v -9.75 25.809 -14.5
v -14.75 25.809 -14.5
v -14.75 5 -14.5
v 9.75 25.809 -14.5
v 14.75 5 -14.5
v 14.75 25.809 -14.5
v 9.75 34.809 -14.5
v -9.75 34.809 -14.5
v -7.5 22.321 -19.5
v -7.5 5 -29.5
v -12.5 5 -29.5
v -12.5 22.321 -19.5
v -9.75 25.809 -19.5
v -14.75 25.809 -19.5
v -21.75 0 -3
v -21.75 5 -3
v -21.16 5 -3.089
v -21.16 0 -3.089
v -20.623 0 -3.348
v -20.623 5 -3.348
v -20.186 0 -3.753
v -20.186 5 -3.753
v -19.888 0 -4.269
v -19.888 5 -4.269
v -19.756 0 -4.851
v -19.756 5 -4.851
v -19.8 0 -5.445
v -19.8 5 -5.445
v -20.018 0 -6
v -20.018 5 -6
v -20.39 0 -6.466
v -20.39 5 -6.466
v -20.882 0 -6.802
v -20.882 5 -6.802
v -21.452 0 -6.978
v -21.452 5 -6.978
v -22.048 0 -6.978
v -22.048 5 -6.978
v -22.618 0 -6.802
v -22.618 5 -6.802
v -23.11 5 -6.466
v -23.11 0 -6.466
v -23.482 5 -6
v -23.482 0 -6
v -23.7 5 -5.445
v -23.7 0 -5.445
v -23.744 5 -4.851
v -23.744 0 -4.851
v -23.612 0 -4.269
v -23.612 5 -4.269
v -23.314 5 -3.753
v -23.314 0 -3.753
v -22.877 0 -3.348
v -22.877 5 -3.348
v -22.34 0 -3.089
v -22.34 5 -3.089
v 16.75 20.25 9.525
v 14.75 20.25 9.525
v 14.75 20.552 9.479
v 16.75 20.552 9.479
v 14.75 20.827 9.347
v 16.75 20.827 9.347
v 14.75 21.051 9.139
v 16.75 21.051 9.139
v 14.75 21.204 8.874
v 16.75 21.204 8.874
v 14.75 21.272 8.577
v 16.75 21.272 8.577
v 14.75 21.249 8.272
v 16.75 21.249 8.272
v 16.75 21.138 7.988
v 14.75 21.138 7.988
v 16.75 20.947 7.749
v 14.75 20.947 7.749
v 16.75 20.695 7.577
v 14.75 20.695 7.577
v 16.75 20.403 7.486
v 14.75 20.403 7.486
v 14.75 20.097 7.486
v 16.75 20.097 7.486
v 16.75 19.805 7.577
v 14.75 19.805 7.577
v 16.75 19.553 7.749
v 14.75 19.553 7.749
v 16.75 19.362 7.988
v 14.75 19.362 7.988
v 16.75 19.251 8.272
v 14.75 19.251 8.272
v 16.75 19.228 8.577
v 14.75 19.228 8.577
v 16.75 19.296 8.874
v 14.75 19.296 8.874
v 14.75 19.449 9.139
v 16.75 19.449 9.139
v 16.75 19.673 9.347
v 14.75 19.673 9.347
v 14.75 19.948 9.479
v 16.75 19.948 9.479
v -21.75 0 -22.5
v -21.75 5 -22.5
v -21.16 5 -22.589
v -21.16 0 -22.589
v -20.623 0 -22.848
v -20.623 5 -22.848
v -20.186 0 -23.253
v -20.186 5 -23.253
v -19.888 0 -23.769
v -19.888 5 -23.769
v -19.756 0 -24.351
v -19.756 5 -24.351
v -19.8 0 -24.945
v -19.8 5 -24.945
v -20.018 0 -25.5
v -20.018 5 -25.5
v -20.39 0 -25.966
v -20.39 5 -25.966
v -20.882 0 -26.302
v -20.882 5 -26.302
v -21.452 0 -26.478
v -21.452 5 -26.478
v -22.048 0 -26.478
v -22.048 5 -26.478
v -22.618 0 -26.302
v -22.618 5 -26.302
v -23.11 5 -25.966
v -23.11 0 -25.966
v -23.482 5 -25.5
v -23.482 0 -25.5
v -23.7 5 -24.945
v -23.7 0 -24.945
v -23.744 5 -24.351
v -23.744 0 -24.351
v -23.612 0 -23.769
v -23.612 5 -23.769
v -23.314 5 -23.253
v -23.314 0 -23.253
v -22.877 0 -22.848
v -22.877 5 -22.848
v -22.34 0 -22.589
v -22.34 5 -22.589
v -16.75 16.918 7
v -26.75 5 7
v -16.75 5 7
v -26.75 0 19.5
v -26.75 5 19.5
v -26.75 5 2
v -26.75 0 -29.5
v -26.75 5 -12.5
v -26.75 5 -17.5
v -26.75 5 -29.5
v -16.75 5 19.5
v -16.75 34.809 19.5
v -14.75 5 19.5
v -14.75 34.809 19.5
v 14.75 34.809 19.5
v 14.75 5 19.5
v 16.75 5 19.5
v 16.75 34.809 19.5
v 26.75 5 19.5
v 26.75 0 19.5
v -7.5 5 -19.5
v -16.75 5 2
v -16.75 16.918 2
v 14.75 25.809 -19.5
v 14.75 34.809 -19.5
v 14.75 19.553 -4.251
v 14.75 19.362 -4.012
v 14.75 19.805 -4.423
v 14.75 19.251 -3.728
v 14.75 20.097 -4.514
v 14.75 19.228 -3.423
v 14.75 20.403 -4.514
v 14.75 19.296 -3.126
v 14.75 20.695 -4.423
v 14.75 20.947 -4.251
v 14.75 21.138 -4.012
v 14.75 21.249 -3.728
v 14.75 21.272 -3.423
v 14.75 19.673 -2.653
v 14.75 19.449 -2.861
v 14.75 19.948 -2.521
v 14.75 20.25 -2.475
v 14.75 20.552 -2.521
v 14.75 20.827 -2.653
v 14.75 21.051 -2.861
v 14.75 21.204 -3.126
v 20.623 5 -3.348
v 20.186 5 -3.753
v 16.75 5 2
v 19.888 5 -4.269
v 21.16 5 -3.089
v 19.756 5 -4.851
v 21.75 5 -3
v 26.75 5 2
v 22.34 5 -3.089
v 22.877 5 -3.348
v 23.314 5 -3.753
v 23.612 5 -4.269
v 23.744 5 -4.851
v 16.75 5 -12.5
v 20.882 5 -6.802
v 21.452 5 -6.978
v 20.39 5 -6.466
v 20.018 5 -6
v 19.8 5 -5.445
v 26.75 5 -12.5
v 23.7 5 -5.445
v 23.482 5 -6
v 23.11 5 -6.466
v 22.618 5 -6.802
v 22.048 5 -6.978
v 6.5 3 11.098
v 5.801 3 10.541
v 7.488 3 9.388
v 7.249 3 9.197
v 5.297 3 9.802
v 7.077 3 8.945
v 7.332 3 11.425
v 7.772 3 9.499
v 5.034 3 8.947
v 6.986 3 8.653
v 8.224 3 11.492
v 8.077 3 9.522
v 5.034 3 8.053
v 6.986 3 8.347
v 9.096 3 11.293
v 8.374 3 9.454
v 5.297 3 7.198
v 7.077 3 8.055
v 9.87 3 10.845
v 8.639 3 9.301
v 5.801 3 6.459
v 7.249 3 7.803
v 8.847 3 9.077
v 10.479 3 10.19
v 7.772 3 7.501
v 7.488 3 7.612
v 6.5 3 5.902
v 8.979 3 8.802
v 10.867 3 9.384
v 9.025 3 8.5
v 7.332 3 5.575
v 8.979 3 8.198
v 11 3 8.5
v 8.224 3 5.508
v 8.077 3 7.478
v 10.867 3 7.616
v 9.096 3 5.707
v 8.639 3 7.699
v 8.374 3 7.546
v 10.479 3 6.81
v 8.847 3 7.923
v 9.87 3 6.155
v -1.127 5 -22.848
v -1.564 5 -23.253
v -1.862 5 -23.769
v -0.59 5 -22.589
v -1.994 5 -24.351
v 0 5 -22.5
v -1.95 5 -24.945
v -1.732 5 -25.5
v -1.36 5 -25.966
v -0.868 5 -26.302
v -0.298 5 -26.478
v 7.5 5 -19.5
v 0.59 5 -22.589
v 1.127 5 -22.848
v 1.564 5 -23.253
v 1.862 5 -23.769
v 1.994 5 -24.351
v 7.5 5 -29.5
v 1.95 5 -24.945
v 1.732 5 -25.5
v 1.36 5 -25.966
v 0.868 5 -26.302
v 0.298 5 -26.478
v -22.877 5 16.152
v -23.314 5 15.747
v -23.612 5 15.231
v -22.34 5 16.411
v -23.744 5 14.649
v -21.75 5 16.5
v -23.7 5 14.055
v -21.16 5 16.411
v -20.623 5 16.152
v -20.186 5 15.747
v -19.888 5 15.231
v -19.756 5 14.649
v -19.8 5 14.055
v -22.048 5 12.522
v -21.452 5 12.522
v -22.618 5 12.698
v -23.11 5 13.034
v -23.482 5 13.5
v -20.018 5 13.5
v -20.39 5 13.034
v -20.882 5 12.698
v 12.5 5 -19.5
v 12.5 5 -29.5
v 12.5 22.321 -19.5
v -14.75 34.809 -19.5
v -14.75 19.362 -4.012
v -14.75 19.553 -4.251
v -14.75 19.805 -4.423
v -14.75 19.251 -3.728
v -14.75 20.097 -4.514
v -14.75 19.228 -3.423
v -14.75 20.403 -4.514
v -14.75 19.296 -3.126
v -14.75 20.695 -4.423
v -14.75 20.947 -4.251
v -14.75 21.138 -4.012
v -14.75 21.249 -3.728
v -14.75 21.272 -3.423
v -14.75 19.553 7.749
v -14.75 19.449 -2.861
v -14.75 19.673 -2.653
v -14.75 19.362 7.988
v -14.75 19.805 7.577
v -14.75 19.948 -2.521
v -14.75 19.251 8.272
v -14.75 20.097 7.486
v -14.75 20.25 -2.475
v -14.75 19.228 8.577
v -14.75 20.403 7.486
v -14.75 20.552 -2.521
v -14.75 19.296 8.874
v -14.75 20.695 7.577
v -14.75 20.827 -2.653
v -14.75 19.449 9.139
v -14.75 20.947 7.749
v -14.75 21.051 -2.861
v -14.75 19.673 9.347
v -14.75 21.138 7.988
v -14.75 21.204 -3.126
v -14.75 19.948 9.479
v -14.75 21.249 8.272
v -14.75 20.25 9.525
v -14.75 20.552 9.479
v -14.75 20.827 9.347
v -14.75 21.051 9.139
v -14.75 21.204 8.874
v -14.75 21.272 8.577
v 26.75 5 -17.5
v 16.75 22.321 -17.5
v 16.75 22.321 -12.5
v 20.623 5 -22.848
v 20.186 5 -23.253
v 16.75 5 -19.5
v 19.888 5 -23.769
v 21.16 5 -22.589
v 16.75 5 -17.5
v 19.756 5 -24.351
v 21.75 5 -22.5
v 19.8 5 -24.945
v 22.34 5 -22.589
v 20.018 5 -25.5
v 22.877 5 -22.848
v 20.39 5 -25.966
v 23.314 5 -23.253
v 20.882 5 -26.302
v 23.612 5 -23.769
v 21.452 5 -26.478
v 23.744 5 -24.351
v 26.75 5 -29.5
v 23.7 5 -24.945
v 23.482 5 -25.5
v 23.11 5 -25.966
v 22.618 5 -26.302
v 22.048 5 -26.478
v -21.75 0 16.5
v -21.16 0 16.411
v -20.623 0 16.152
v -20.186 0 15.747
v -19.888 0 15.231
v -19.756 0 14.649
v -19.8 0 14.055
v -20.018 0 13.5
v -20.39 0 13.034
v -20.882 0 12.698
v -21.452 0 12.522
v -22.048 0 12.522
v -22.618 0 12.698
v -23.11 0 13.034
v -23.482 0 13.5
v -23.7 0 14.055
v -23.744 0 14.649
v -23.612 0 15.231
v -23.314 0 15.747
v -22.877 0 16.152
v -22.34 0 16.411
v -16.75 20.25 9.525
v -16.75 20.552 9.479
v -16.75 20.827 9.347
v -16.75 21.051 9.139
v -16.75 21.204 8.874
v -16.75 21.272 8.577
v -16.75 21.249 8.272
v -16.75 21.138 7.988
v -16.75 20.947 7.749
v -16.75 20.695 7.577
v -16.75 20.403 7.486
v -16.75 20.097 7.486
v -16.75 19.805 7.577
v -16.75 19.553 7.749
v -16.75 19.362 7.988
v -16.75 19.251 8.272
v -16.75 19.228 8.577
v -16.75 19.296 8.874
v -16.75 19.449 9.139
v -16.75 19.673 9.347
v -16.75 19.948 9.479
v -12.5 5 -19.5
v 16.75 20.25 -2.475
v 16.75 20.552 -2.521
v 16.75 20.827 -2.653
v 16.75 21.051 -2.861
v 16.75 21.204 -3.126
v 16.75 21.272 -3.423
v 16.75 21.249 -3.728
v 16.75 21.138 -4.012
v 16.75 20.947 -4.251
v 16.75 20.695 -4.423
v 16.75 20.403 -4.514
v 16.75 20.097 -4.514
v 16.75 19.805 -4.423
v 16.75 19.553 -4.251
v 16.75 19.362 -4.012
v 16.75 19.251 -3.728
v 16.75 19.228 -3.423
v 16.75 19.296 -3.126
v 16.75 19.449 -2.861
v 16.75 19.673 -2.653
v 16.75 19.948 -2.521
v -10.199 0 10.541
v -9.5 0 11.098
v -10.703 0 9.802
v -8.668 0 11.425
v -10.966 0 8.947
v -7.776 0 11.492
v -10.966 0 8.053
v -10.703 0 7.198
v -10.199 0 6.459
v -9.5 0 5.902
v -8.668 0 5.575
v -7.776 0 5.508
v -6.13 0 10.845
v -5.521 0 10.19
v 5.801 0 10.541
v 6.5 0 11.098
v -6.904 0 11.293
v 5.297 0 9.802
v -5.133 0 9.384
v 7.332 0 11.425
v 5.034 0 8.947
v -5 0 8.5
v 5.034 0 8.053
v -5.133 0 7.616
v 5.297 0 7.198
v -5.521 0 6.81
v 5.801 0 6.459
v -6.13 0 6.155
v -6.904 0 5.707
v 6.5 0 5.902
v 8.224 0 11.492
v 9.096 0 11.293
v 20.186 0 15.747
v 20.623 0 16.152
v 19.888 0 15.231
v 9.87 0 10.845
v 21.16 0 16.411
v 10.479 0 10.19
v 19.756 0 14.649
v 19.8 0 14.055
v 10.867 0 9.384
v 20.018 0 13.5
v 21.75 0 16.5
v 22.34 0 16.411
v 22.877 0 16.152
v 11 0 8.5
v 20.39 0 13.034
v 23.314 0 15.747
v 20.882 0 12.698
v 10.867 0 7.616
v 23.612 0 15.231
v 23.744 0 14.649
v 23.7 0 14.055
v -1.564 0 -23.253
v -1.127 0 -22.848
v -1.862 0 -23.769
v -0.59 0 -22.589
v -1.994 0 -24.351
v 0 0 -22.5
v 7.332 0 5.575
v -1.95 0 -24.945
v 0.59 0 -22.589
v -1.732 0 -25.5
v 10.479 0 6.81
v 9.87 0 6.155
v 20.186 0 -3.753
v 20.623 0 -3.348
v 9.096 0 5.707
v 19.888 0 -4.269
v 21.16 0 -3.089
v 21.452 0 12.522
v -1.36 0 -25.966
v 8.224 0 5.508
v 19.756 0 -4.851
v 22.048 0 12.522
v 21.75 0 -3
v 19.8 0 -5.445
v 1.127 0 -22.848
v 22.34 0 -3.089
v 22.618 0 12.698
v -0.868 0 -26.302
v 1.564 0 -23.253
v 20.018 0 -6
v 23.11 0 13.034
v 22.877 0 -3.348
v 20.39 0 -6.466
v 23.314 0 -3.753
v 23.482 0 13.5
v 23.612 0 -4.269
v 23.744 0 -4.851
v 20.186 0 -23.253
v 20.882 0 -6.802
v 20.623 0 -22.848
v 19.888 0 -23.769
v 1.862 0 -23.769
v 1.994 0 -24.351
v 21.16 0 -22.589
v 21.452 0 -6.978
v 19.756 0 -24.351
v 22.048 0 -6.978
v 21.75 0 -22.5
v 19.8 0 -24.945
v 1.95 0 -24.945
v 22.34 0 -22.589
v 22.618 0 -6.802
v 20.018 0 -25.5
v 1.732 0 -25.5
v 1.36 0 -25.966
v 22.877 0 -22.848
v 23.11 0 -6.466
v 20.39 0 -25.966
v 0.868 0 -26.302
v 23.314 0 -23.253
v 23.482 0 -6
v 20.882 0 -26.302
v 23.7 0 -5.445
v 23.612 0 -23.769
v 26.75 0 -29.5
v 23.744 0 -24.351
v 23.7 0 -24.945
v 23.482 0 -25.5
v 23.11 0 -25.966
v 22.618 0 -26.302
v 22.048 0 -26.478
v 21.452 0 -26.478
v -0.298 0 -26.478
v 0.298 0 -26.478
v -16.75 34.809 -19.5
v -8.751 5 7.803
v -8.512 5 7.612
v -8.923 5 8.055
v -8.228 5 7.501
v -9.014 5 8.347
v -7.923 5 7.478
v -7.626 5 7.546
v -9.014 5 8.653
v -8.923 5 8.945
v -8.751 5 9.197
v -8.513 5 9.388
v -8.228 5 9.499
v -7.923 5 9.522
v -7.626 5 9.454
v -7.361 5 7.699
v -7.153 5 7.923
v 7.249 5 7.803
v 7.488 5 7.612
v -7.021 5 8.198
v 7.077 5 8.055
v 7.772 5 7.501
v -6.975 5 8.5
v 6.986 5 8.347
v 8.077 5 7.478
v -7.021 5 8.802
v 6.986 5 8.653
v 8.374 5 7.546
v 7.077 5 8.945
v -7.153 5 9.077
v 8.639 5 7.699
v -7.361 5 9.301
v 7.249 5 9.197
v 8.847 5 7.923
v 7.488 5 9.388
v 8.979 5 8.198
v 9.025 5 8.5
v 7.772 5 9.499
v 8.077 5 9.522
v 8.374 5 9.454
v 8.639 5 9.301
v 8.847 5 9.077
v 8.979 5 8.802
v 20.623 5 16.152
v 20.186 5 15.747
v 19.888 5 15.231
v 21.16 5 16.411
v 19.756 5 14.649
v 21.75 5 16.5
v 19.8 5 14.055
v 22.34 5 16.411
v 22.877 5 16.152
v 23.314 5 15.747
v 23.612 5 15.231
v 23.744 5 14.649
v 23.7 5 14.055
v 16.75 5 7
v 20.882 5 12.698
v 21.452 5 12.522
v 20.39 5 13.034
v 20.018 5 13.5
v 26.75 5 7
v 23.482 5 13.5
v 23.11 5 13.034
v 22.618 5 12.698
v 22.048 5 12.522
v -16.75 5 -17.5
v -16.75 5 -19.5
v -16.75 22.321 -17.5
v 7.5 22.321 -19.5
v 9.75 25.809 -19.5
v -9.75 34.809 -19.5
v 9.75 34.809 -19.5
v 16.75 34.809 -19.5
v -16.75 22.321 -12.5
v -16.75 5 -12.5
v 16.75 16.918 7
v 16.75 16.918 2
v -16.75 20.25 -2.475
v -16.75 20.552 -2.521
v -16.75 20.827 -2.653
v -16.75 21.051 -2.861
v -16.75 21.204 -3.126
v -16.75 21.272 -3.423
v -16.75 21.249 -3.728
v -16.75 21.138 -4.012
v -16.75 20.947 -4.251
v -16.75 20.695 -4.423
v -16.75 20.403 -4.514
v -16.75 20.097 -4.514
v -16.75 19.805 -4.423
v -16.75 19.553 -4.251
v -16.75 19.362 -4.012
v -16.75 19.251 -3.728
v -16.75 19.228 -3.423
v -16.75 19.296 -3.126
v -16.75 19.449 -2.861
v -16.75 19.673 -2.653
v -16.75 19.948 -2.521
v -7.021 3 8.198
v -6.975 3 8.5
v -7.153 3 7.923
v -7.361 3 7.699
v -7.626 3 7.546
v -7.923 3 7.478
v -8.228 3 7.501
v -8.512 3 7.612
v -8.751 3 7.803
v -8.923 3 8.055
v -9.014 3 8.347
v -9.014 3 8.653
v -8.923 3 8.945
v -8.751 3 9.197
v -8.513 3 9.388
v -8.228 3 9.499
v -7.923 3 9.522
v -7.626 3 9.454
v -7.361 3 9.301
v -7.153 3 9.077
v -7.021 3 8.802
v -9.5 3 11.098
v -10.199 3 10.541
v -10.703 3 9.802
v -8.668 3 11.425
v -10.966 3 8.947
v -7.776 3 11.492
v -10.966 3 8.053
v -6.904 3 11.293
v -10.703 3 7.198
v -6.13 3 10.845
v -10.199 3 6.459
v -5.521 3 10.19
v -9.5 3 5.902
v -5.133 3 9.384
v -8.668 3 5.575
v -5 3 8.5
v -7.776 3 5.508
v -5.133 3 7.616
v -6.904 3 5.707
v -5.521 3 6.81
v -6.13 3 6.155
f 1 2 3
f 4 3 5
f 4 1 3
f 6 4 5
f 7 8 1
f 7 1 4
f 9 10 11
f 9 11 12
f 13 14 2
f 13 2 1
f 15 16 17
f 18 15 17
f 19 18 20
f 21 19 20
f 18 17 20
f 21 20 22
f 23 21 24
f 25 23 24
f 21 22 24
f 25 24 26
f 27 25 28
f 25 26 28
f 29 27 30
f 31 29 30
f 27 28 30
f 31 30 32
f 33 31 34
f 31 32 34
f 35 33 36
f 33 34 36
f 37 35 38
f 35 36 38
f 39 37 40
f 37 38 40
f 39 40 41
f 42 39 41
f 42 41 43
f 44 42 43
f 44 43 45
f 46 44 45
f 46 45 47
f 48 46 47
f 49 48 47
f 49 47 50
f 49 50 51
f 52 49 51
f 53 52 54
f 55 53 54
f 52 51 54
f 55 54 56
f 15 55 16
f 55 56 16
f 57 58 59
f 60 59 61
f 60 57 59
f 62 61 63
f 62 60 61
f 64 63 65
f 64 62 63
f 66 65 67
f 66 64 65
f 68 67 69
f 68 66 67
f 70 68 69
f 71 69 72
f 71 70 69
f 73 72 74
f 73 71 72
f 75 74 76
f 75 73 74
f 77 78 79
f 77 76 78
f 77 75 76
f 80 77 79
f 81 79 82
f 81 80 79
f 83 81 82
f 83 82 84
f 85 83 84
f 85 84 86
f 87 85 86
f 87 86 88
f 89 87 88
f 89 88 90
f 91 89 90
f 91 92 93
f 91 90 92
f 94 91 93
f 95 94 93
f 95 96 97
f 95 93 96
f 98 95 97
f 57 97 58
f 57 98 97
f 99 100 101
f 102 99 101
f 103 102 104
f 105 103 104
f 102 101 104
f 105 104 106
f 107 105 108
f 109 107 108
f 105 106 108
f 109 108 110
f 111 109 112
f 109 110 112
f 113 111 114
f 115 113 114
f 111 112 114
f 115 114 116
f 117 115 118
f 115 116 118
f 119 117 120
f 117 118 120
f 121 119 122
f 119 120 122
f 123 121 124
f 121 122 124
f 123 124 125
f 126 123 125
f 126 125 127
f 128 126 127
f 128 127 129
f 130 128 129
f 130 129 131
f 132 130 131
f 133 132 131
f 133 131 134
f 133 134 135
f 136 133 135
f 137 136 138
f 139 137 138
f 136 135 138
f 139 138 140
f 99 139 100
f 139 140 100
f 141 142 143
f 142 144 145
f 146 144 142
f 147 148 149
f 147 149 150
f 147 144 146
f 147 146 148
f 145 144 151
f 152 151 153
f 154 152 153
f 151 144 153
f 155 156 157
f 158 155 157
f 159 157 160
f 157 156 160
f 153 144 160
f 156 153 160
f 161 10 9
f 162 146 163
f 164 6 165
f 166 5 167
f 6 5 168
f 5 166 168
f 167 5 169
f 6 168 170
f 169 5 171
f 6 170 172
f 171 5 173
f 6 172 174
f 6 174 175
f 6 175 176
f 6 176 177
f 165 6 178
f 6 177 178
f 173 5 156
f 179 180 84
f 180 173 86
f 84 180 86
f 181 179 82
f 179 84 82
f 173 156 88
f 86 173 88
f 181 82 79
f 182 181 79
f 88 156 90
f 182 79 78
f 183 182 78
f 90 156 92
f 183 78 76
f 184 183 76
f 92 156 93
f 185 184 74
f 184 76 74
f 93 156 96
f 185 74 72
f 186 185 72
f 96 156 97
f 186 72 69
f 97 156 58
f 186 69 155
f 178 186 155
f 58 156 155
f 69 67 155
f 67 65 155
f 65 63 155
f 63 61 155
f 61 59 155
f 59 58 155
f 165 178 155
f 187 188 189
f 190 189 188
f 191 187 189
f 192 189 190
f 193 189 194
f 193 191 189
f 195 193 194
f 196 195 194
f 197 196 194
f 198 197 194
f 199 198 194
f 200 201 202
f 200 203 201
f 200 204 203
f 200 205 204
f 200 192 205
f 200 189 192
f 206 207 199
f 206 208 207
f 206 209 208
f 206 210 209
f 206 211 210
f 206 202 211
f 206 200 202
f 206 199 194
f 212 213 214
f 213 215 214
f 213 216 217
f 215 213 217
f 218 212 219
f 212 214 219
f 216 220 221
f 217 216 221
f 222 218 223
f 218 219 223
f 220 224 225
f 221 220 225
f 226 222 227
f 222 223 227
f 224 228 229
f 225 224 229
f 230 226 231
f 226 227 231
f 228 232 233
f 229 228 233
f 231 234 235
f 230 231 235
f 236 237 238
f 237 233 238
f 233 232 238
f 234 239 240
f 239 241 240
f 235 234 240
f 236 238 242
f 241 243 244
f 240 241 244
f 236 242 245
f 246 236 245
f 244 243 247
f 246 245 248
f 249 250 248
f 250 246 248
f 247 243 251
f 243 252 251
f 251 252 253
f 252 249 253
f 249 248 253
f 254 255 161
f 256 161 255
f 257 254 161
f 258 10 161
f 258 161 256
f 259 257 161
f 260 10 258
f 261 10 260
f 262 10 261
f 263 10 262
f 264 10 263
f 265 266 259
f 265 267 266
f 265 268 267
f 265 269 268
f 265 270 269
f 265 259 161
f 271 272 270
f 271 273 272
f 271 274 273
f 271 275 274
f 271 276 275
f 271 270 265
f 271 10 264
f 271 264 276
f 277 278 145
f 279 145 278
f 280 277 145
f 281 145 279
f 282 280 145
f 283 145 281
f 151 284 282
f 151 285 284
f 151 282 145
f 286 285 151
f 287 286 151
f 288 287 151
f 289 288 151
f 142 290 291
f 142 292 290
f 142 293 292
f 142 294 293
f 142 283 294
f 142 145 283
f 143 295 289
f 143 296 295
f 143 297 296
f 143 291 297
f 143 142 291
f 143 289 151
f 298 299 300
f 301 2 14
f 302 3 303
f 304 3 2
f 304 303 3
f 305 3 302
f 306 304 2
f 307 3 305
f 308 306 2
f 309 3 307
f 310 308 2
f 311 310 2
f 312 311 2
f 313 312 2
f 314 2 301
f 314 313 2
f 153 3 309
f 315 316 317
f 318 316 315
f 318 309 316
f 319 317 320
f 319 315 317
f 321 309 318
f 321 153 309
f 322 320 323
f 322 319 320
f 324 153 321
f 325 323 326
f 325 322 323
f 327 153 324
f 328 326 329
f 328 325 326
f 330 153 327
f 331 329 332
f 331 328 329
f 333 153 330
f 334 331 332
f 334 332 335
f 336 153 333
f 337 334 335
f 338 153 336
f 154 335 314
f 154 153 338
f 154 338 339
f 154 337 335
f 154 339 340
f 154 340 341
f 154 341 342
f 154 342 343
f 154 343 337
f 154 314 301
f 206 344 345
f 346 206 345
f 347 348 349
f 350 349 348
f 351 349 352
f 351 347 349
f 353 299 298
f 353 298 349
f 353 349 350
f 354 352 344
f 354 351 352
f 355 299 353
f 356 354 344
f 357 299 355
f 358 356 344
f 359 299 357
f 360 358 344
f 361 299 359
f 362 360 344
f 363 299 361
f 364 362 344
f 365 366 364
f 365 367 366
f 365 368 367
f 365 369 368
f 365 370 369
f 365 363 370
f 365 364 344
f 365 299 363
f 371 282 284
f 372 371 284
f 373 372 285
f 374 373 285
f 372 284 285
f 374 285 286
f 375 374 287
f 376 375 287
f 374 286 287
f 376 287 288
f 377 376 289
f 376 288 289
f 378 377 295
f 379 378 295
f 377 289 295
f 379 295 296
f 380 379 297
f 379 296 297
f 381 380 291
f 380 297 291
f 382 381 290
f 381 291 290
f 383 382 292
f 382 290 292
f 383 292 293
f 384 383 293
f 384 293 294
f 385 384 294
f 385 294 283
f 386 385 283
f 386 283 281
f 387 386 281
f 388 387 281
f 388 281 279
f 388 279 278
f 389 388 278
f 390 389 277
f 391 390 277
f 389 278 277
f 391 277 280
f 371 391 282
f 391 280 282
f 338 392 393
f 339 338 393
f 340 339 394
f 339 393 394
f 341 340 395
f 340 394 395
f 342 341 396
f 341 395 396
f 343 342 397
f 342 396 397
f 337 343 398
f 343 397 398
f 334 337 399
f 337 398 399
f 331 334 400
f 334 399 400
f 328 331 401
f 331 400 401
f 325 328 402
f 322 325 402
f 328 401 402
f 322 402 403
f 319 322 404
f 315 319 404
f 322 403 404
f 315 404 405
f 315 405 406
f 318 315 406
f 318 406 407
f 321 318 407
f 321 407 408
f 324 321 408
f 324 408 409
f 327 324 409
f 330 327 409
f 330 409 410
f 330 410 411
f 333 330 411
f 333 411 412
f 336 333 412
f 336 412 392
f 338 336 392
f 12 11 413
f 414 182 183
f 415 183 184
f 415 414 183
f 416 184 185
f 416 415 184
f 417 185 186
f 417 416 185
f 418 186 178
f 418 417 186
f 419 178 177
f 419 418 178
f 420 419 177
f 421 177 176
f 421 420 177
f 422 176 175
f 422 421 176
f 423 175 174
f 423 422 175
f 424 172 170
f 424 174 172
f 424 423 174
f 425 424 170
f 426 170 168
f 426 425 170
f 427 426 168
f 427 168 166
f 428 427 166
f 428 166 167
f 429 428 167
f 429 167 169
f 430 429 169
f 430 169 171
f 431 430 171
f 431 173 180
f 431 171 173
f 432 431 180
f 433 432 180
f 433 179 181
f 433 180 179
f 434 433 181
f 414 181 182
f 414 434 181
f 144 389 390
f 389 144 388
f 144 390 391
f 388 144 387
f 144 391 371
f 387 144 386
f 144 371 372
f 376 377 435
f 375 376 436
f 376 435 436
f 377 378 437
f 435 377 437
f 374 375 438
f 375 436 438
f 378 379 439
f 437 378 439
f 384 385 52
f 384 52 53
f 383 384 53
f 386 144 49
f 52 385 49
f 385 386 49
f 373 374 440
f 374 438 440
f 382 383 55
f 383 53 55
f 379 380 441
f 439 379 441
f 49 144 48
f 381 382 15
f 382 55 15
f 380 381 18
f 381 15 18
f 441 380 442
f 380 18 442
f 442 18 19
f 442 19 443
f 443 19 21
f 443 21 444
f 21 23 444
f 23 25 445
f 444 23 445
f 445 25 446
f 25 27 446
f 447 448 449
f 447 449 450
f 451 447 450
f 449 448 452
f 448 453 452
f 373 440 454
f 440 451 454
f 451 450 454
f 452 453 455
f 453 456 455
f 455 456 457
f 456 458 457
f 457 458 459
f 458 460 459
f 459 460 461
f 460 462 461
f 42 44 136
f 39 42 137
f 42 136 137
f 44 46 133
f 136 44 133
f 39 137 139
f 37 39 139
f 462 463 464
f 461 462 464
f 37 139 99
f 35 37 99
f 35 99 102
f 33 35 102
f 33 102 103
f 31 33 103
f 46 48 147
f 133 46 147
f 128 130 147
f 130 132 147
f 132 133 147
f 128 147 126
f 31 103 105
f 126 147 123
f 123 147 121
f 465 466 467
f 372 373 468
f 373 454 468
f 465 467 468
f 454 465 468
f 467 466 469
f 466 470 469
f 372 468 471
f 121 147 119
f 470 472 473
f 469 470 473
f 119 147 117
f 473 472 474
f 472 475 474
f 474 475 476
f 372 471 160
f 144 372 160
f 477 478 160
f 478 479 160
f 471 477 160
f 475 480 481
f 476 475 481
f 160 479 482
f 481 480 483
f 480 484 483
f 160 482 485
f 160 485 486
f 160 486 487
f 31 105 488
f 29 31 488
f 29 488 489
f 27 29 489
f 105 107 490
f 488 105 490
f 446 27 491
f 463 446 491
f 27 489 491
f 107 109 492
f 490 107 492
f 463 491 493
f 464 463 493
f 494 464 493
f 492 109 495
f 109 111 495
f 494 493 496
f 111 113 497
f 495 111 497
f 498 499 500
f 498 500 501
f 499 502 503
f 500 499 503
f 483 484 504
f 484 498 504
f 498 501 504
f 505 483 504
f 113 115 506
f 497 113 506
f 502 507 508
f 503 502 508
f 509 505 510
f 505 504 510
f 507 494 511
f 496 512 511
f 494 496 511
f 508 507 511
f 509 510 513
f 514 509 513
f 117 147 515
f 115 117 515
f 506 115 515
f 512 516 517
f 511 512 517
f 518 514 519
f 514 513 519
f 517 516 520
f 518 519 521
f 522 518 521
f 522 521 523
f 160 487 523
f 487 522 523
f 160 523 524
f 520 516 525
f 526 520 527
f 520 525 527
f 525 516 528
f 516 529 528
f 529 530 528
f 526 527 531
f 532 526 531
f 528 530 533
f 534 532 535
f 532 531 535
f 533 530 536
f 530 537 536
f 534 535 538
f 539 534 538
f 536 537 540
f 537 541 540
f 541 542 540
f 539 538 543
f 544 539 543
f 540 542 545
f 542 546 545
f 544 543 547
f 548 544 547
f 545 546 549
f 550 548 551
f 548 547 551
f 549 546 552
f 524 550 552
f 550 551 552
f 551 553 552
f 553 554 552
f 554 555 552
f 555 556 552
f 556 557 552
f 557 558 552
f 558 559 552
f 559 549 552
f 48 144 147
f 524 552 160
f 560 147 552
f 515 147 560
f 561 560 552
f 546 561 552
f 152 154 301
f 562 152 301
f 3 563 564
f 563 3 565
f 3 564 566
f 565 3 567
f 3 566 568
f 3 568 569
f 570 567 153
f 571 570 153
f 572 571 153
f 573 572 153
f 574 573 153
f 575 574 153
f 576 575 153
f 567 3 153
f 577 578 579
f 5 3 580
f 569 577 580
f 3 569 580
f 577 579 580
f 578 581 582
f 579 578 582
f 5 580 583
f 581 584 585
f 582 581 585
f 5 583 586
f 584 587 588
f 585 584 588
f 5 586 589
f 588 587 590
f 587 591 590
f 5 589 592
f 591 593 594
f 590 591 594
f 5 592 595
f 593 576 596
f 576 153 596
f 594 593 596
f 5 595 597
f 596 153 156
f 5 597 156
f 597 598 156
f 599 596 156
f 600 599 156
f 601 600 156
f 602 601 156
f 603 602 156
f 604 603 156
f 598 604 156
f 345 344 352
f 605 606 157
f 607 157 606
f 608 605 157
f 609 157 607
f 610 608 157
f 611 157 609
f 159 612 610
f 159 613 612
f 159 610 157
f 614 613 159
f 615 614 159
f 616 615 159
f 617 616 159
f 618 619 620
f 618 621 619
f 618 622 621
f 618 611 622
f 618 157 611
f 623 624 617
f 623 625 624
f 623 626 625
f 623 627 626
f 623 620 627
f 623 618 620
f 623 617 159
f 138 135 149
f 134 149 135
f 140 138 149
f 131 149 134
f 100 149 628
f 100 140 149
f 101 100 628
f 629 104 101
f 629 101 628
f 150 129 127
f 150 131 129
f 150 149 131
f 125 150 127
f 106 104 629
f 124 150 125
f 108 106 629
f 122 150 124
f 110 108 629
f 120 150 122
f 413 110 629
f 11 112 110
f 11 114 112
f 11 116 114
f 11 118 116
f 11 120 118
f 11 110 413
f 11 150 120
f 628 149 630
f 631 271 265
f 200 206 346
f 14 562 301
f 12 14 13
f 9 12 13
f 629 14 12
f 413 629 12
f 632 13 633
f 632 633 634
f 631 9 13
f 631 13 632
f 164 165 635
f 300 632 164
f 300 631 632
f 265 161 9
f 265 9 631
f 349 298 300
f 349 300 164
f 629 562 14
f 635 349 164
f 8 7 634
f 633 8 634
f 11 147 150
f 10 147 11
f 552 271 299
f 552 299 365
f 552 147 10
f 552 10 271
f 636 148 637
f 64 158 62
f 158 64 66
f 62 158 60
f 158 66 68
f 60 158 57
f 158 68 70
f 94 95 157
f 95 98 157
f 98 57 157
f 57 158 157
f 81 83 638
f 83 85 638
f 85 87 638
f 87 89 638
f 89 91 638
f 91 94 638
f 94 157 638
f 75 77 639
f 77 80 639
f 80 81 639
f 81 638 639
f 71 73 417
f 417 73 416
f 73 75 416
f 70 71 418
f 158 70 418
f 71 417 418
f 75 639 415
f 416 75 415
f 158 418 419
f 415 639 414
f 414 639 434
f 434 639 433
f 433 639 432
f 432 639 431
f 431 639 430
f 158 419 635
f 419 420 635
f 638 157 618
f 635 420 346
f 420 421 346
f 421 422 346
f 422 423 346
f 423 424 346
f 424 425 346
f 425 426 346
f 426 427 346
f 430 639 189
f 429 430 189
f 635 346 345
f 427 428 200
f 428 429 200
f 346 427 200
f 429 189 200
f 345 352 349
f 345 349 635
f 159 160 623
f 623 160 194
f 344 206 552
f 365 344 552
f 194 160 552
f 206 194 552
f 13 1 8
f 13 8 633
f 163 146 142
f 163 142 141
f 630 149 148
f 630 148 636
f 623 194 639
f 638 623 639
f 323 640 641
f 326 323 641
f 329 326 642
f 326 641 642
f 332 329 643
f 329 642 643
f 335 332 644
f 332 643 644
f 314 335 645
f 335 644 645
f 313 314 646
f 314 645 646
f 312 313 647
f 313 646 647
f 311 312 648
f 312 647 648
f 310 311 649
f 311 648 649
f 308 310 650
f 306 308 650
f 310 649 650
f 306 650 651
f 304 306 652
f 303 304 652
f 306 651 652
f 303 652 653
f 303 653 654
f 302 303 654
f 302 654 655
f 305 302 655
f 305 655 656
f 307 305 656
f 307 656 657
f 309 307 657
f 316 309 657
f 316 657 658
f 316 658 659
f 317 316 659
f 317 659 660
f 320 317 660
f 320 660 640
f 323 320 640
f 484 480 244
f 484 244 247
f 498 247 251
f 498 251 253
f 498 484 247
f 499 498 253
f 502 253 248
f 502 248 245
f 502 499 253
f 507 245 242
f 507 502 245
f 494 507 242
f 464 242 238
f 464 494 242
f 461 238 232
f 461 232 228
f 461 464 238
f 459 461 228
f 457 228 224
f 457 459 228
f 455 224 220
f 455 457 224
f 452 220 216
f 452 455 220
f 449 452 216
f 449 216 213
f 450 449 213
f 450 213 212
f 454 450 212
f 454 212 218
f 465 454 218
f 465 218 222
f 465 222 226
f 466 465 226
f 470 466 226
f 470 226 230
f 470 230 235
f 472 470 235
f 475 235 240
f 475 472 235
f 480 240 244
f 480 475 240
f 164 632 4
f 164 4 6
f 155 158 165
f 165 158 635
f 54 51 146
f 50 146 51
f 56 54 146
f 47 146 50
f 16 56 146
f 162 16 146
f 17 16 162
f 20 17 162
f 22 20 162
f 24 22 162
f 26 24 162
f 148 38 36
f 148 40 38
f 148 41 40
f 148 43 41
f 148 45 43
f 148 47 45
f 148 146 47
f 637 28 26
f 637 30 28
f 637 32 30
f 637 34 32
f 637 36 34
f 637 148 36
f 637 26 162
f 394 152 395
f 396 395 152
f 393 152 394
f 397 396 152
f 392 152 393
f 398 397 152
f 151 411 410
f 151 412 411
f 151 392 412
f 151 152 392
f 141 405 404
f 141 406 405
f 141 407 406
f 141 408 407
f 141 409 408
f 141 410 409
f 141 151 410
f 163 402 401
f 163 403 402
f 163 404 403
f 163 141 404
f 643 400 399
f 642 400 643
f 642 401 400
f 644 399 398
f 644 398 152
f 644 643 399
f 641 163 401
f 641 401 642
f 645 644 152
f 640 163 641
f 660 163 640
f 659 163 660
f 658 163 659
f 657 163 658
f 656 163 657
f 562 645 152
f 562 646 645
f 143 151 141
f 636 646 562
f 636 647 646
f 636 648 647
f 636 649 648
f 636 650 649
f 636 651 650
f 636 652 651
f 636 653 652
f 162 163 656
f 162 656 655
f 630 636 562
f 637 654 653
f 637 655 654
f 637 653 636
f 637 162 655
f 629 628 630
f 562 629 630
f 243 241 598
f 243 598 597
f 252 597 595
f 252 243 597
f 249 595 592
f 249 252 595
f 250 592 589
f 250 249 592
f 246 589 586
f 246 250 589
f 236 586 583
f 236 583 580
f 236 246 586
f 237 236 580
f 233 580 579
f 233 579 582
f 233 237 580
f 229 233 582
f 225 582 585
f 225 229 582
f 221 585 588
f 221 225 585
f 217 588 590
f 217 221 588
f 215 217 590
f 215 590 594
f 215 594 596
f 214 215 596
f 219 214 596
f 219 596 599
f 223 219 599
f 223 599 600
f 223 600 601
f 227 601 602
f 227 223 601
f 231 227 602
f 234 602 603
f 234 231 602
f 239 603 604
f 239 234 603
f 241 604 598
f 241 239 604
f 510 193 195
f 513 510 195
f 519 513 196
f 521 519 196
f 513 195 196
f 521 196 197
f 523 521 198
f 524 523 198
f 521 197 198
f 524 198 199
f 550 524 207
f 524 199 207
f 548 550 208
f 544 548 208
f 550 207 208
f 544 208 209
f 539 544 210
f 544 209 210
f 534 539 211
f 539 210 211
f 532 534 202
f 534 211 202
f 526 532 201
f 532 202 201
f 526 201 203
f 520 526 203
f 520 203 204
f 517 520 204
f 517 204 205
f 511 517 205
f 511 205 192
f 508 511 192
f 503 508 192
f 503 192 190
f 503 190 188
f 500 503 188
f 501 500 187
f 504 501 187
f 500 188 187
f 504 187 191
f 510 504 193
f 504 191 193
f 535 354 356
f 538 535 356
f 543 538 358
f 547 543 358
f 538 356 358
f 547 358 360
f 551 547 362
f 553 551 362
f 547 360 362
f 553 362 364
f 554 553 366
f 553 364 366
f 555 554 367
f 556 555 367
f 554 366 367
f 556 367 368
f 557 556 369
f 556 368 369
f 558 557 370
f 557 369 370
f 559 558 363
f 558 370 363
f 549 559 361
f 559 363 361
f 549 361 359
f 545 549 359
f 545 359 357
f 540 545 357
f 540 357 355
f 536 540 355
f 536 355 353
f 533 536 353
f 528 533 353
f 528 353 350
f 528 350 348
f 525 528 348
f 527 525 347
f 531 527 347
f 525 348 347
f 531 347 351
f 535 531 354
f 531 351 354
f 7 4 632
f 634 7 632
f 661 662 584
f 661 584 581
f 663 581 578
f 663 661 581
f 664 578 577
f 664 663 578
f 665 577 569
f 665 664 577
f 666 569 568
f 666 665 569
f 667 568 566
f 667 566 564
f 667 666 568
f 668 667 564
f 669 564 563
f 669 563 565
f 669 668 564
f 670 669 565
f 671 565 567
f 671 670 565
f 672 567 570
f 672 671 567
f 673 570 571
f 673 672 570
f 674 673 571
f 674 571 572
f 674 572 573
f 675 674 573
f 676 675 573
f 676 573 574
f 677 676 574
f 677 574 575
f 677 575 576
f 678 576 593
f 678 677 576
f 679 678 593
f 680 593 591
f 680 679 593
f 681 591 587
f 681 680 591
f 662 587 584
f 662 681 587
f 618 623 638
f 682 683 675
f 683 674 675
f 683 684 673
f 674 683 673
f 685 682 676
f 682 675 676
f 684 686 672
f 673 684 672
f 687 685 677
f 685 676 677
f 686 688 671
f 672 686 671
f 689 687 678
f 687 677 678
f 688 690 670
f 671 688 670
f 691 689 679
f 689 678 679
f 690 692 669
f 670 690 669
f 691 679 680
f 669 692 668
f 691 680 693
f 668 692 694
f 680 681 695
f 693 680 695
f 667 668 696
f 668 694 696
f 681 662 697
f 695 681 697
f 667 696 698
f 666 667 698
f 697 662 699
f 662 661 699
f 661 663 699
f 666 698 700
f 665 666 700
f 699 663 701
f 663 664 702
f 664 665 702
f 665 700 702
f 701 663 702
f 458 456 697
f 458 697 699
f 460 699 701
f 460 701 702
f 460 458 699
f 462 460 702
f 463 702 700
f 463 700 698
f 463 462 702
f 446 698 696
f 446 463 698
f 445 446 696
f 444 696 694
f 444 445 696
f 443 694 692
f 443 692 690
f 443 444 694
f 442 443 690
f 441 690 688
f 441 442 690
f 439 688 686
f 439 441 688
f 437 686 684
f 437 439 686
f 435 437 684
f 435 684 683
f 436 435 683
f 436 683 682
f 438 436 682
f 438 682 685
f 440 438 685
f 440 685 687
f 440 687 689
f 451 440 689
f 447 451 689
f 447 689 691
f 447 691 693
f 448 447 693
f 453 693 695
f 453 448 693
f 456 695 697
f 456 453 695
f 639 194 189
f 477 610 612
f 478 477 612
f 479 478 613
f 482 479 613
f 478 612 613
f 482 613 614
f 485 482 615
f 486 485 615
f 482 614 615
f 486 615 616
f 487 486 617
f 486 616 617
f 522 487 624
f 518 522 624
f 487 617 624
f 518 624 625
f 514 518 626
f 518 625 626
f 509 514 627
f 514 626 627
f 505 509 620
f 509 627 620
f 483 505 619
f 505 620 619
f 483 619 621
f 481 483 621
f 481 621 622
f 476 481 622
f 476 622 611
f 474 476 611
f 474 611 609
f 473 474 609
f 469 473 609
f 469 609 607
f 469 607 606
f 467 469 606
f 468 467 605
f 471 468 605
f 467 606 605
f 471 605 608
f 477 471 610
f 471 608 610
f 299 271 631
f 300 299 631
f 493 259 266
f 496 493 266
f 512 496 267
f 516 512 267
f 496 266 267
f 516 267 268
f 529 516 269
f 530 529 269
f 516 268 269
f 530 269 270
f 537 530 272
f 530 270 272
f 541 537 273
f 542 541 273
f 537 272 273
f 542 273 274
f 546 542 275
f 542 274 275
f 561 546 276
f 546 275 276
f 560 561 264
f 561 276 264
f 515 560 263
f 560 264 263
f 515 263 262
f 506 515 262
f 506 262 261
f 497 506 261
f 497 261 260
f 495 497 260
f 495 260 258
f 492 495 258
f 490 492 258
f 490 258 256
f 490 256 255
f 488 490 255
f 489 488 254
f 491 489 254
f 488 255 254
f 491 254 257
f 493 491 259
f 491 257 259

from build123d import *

# Parameters (mm, degrees)
ESQUISSE1_W             = 33.5
ESQUISSE1_H             = 39
BOSS_EXTRU_1_DEPTH      = 49
ESQUISSE3_W             = 29.5
ESQUISSE3_H             = 44
ENL_V_MAT_EXTRU_1_DEPTH = 34
ESQUISSE4_W             = 53.5
ESQUISSE4_H             = 49
BOSS_EXTRU_2_DEPTH      = 5
ESQUISSE5_R             = 2
ENL_V_MAT_EXTRU_2_DEPTH = 5
NERVURE3_REACH          = 67.365
ESQUISSE8_WALL_W        = 148.286921202
ESQUISSE8_WALL_H        = 5
NERVURE4_REACH          = 67.626
ESQUISSE9_WALL_W        = 153.252619022
ESQUISSE9_WALL_H        = 5
NERVURE5_REACH          = 69.984
ESQUISSE10_WALL_W       = 157.967827076
ESQUISSE10_WALL_H       = 5
ESQUISSE11_R            = 1.025
ENL_V_MAT_EXTRU_3_DEPTH = 5
ESQUISSE13_W            = 39
ESQUISSE13_H            = 14.190780958
ENL_V_MAT_EXTRU_5_DEPTH = 72.857497869
SYM_TRIE6_START         = 25.809219042
SYM_TRIE6_OUTLINE_W     = 5
SYM_TRIE6_OUTLINE_H     = 5
SYM_TRIE6_DEPTH         = 9
SYM_TRIE6_2_OUTLINE_R   = 3
SYM_TRIE6_2_DEPTH       = 3
SYM_TRIE6_START_2       = 3
SYM_TRIE6_3_OUTLINE_R   = 1.025
SYM_TRIE6_3_DEPTH       = 2


# Read off the part's stored shape, not the designer's step: Symétrie6
with BuildPart() as part:
    # Esquisse1 → Boss.-Extru.1 (new body)
    with BuildSketch(Plane(origin=(0, 0, 0), x_dir=(1, 0, 0), z_dir=(0, 1, 0))):
        Rectangle(ESQUISSE1_W, ESQUISSE1_H)
    extrude(amount=BOSS_EXTRU_1_DEPTH)

    # Esquisse3 → Enlèv. mat.-Extru.1 (cut)
    with BuildSketch(Plane.XY.offset(19.5)):
        with Locations((0, 27)):
            Rectangle(ESQUISSE3_W, ESQUISSE3_H)
    extrude(amount=-ENL_V_MAT_EXTRU_1_DEPTH, mode=Mode.SUBTRACT)

    # Esquisse4 → Boss.-Extru.2 (add)
    with BuildSketch(Plane(origin=(0, 0, 0), x_dir=(1, 0, 0), z_dir=(0, 1, 0))):
        with Locations((0, 5)):
            Rectangle(ESQUISSE4_W, ESQUISSE4_H)
    extrude(amount=BOSS_EXTRU_2_DEPTH)

    # Esquisse5 → Enlèv. mat.-Extru.2 (cut)
    with BuildSketch(Plane(origin=(0, 5, 0), x_dir=(1, 0, 0), z_dir=(0, 1, 0))):
        with Locations(Location((-21.75, 24.5, 0), (0, 0, 270))):
            Circle(ESQUISSE5_R)
        with Locations(Location((0, 24.5, 0), (0, 0, 270))):
            Circle(ESQUISSE5_R)
        with Locations(Location((21.75, 24.5, 0), (0, 0, 270))):
            Circle(ESQUISSE5_R)
        with Locations(Location((21.75, 5, 0), (0, 0, 270))):
            Circle(ESQUISSE5_R)
        with Locations(Location((21.75, -14.5, 0), (0, 0, 270))):
            Circle(ESQUISSE5_R)
        with Locations(Location((-21.75, -14.5, 0), (0, 0, 270))):
            Circle(ESQUISSE5_R)
        with Locations(Location((-21.75, 5, 0), (0, 0, 270))):
            Circle(ESQUISSE5_R)
    extrude(amount=-ENL_V_MAT_EXTRU_2_DEPTH, mode=Mode.SUBTRACT)

    # Esquisse8 wall → Nervure3 (add, up to next)
    with BuildSketch(Plane(origin=(21.75, 10.958767963, 4.5), x_dir=(-0.642787609685, 0.766044443121, 0), z_dir=(-0.766044443121, -0.642787609685, 0)), mode=Mode.PRIVATE) as nervure3_sk1:
        Rectangle(ESQUISSE8_WALL_W, ESQUISSE8_WALL_H)
    nervure3_tool1 = extrude(nervure3_sk1.sketch, amount=NERVURE3_REACH, mode=Mode.PRIVATE) - part.part
    nervure3 = nervure3_tool1.solids().sort_by_distance((21.75, 10.958767963, 4.5))[0]
    add(nervure3)

    # Esquisse9 wall → Nervure4 (add, up to next)
    with BuildSketch(Plane(origin=(21.75, 13.660254038, -15), x_dir=(-0.499999999993, 0.866025403788, 0), z_dir=(-0.866025403788, -0.499999999993, 0)), mode=Mode.PRIVATE) as nervure4_sk1:
        Rectangle(ESQUISSE9_WALL_W, ESQUISSE9_WALL_H)
    nervure4_tool1 = extrude(nervure4_sk1.sketch, amount=NERVURE4_REACH, mode=Mode.PRIVATE) - part.part
    nervure4 = nervure4_tool1.solids().sort_by_distance((21.75, 13.660254038, -15))[0]
    add(nervure4)

    # Esquisse10 wall → Nervure5 (add, up to next)
    with BuildSketch(Plane(origin=(10, 13.660254038, -24.5), x_dir=(0, 0.866025403788, 0.499999999993), z_dir=(0, -0.499999999993, 0.866025403788)), mode=Mode.PRIVATE) as nervure5_sk1:
        Rectangle(ESQUISSE10_WALL_W, ESQUISSE10_WALL_H)
    nervure5_tool1 = extrude(nervure5_sk1.sketch, amount=NERVURE5_REACH, mode=Mode.PRIVATE) - part.part
    nervure5 = nervure5_tool1.solids().sort_by_distance((10, 13.660254038, -24.5))[0]
    add(nervure5)

    # Symétrie1: Nervure5 across plane
    add(nervure5.mirror(Plane(origin=(0, 0, 0), x_dir=(0, 0, 1), z_dir=(1, 0, 0))))

    # Symétrie3: Nervure3, Nervure4 across plane
    add(nervure3.mirror(Plane(origin=(0, 0, 0), x_dir=(0, 0, 1), z_dir=(1, 0, 0))))
    add(nervure4.mirror(Plane(origin=(0, 0, 0), x_dir=(0, 0, 1), z_dir=(1, 0, 0))))

    # Esquisse11 → Enlèv. mat.-Extru.3 (cut)
    with BuildSketch(Plane.ZY.offset(16.75)):
        with Locations((-3.5, 44.25)):
            Circle(ESQUISSE11_R)
        with Locations((8.5, 44.25)):
            Circle(ESQUISSE11_R)
        with Locations((-3.5, 20.25)):
            Circle(ESQUISSE11_R)
        with Locations((8.5, 20.25)):
            Circle(ESQUISSE11_R)
    enl_v_mat_extru_3 = extrude(amount=-ENL_V_MAT_EXTRU_3_DEPTH, mode=Mode.SUBTRACT)

    # Symétrie4: Enlèv. mat.-Extru.3 across plane
    add(enl_v_mat_extru_3.mirror(Plane(origin=(0, 0, 0), x_dir=(0, 0, 1), z_dir=(1, 0, 0))), mode=Mode.SUBTRACT)

    # Esquisse13 → Enlèv. mat.-Extru.5 (cut, through all)
    with BuildSketch(Plane(origin=(16.75, 0, 0), x_dir=(0, 0, -1), z_dir=(1, 0, 0))):
        with Locations((0, 41.904609521)):
            Rectangle(ESQUISSE13_W, ESQUISSE13_H)
    extrude(amount=-ENL_V_MAT_EXTRU_5_DEPTH, mode=Mode.SUBTRACT)

    # Symétrie6 outline → Symétrie6 (cut)
    with BuildSketch(Plane(origin=(0, 0, 0), x_dir=(1, 0, 0), z_dir=(0, 1, 0)).offset(SYM_TRIE6_START)):
        with Locations((-12.25, 17)):
            Rectangle(SYM_TRIE6_OUTLINE_W, SYM_TRIE6_OUTLINE_H)
        with Locations((12.25, 17)):
            Rectangle(SYM_TRIE6_OUTLINE_W, SYM_TRIE6_OUTLINE_H)
    extrude(amount=SYM_TRIE6_DEPTH, mode=Mode.SUBTRACT)

    # Sym_trie6 2 outline → Sym_trie6 2 (cut)
    with BuildSketch(Plane(origin=(0, 0, 0), x_dir=(1, 0, 0), z_dir=(0, 1, 0))):
        with Locations((8, -8.5)):
            Circle(SYM_TRIE6_2_OUTLINE_R)
        with Locations((-8, -8.5)):
            Circle(SYM_TRIE6_2_OUTLINE_R)
    extrude(amount=SYM_TRIE6_2_DEPTH, mode=Mode.SUBTRACT)

    # Sym_trie6 3 outline → Sym_trie6 3 (cut)
    with BuildSketch(Plane(origin=(0, 0, 0), x_dir=(1, 0, 0), z_dir=(0, 1, 0)).offset(SYM_TRIE6_START_2)):
        with Locations((8, -8.5)):
            Circle(SYM_TRIE6_3_OUTLINE_R)
        with Locations((-8, -8.5)):
            Circle(SYM_TRIE6_3_OUTLINE_R)
    extrude(amount=SYM_TRIE6_3_DEPTH, mode=Mode.SUBTRACT)


solid = part.part
